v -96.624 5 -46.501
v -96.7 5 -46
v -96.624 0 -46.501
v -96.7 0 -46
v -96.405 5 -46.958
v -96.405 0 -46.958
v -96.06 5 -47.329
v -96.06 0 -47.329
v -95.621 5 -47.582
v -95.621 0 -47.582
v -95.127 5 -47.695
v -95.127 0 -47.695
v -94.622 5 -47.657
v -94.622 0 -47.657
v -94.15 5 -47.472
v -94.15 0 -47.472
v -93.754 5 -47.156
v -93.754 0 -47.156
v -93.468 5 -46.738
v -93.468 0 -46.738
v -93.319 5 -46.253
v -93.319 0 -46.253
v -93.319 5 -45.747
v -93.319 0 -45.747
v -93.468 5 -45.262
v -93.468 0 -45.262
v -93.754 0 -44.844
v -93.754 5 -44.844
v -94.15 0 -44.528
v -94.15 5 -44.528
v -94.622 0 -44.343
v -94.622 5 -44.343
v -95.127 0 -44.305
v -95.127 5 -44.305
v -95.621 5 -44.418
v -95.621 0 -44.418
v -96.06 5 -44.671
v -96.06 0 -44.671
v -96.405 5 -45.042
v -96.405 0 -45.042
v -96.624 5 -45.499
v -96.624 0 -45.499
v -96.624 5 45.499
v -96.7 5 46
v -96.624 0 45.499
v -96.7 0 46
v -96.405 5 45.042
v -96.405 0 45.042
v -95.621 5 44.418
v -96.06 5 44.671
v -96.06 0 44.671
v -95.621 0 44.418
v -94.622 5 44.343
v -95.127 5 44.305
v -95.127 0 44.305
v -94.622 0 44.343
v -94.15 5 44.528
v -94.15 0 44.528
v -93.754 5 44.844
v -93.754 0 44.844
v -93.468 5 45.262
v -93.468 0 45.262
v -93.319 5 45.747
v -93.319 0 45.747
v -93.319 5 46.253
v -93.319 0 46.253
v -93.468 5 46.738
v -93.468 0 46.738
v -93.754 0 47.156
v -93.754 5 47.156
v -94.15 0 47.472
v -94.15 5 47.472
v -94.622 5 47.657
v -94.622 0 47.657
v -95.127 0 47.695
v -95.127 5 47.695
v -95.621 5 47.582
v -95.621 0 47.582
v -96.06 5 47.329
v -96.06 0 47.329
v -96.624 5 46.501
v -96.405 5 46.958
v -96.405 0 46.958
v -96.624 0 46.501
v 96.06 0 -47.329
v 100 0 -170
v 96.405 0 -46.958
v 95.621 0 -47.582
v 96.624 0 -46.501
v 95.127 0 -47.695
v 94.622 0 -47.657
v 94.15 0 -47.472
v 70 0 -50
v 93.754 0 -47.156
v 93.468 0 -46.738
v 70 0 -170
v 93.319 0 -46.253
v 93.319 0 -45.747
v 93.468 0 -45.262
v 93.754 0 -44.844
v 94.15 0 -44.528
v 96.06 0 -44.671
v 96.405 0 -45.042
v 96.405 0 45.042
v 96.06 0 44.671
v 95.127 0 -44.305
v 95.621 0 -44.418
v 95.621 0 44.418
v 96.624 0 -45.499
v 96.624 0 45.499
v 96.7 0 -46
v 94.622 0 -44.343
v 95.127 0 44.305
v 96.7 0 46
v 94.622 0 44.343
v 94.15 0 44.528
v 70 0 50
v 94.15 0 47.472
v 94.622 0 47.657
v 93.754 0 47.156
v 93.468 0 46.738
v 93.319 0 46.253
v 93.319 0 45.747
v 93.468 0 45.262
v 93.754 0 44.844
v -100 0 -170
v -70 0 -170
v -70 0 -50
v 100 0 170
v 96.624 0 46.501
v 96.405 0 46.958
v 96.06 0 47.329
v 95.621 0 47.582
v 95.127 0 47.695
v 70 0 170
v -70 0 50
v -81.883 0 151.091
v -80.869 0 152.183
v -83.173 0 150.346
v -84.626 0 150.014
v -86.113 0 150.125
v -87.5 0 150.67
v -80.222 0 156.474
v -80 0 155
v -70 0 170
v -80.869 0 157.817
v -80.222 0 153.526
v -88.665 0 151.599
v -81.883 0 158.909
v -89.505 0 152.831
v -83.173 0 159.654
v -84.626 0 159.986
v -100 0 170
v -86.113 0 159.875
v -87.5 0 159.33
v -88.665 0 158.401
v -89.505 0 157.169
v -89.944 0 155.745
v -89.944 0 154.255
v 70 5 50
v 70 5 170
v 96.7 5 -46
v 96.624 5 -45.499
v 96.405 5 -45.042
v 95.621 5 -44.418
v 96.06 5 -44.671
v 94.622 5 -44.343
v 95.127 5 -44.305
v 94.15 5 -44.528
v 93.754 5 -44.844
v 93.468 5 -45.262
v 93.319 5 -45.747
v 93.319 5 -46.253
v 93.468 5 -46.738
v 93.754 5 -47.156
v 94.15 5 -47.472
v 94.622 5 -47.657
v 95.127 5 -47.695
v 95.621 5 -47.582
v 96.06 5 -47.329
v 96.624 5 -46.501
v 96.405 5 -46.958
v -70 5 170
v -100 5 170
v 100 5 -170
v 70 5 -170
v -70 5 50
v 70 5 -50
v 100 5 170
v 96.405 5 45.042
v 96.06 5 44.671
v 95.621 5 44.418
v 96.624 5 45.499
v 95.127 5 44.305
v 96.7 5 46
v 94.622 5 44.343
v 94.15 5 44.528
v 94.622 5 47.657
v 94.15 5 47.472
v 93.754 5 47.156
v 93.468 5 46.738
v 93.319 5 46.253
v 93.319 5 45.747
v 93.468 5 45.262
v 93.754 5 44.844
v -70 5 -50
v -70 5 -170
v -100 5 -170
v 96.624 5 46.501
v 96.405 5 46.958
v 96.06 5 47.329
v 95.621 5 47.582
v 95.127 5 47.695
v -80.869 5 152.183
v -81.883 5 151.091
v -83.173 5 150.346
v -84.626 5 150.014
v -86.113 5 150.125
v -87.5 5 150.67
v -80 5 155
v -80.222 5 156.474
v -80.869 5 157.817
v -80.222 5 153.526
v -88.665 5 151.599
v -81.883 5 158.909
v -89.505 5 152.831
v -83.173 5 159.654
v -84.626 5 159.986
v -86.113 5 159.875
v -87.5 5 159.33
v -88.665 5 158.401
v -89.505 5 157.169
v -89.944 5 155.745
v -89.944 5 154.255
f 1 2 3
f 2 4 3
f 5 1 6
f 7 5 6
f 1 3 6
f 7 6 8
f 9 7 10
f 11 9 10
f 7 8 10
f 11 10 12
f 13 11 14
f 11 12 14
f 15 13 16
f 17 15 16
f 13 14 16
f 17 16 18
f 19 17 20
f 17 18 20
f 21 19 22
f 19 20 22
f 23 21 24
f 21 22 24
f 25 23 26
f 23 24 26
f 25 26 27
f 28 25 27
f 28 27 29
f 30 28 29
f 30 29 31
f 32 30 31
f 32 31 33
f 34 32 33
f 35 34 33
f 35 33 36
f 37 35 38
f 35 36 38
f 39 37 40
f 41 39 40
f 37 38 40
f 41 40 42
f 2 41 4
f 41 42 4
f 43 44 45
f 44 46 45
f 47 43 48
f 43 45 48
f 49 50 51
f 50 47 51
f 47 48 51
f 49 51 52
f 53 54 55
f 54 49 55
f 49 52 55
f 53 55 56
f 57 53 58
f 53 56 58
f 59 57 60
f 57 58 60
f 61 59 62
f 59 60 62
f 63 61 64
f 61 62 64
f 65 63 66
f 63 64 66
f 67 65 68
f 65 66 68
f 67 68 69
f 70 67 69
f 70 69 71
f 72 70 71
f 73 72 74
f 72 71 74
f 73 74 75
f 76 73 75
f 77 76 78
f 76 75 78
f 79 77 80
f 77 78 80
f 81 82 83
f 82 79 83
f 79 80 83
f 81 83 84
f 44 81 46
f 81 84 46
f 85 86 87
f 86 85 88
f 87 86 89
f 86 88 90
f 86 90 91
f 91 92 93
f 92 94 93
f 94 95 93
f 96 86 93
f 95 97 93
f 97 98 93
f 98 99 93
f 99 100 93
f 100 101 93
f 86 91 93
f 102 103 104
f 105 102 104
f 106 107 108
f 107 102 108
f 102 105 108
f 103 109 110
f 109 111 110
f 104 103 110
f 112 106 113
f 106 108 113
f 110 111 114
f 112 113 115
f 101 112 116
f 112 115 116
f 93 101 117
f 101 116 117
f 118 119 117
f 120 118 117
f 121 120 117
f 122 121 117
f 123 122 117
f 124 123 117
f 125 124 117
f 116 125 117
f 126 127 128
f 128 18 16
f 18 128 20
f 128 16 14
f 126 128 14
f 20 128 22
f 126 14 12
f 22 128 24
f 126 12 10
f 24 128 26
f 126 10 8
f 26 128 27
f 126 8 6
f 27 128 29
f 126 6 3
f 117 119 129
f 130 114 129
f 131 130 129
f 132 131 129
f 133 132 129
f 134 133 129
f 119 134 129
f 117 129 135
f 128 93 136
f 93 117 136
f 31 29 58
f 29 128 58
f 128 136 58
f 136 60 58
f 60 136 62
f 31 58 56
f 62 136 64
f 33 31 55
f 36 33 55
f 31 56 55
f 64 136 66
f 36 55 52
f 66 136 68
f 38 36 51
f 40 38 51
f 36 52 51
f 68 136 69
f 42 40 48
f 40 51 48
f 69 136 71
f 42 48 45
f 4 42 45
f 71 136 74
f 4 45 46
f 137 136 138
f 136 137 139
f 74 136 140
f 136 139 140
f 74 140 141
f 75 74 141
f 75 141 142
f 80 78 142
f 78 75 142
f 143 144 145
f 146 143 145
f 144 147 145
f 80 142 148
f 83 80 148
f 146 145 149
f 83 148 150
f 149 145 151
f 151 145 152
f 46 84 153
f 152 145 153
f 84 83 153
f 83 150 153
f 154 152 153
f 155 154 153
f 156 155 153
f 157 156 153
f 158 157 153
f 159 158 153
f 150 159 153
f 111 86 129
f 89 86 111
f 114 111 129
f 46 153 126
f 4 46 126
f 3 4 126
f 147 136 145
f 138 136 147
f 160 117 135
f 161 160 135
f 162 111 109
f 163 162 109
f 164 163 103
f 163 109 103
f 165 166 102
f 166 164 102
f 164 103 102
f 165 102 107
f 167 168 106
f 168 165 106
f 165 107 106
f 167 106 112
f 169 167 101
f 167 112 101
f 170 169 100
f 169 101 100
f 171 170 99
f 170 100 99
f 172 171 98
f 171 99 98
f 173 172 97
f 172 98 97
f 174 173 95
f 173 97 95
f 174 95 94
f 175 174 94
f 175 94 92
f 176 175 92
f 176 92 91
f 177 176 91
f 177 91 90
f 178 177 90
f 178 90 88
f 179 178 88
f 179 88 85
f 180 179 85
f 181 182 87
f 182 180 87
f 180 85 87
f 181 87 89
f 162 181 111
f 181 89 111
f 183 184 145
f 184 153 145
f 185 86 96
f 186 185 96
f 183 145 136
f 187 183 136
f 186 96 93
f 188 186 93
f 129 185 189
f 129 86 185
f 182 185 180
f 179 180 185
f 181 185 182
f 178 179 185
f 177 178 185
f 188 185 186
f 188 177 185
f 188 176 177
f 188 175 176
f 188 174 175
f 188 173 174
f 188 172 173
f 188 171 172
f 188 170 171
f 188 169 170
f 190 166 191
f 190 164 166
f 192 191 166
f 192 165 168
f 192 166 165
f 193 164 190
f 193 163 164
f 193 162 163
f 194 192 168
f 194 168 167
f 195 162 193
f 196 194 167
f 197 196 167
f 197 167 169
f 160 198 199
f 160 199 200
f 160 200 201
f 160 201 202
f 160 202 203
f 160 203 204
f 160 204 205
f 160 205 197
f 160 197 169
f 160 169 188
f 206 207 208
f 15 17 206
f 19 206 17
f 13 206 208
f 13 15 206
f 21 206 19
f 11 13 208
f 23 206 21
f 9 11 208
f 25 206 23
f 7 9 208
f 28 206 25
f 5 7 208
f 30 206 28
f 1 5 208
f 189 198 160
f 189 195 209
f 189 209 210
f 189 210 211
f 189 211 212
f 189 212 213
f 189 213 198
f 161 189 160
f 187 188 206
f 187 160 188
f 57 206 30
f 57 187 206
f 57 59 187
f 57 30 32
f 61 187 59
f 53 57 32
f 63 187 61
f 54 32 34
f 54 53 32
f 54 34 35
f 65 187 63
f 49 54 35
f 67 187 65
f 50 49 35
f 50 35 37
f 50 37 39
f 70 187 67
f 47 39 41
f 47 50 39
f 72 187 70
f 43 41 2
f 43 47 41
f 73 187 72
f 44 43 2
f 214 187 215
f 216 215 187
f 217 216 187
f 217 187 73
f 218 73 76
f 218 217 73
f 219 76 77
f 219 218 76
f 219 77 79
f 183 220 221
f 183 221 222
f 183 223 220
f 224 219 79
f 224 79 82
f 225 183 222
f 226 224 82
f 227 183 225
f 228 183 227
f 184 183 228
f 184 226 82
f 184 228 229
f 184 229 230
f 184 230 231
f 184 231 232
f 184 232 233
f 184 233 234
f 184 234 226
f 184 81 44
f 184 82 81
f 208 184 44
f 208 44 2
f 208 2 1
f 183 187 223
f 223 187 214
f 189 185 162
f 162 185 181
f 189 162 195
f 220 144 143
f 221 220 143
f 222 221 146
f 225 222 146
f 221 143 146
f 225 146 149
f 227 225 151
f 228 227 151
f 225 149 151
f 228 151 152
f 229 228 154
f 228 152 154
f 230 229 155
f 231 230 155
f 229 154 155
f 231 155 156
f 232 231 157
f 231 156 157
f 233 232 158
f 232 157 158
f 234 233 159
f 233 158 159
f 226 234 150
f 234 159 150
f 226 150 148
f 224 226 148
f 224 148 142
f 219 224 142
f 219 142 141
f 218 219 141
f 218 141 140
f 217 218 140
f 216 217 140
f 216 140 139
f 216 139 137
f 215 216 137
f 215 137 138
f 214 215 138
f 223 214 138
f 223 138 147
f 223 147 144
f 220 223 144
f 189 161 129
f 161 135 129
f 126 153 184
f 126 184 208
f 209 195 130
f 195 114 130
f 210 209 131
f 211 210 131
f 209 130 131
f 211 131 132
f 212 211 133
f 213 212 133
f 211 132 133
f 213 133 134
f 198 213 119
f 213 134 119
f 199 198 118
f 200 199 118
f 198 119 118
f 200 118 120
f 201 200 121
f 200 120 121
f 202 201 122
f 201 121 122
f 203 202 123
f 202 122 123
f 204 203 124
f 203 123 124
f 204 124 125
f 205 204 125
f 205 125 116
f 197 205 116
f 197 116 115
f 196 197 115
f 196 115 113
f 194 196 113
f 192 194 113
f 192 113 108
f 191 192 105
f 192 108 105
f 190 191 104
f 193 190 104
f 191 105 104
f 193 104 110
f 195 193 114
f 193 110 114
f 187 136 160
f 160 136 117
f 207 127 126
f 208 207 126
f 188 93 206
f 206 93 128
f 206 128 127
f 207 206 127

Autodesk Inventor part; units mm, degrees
ref_plane "YZ Plane" through (0, 0, 0) normal (1, 0, 0) x (0, 1, 0)
ref_plane "XZ Plane" through (0, 0, 0) normal (0, 1, 0) x (-1, 0, 0)
ref_plane "XY Plane" through (0, 0, 0) normal (0, 0, 1) x (1, 0, 0)
sketch "Skizze1" plane through (0, 0, 0) normal (0, 1, 0) x (-1, 0, 0)
  line L0 (127.3199, 0) -> (-102.7808, 0) construction
  line L1 (0, 142.2638) -> (0, -235.5235) construction
  line L2 (100, 50) -> (100, 0)
  line L3 (70, 50) -> (0, 50)
  line L4 (0, 0) -> (100, 0)
  line L5 (0, 50) -> (0, 0)
  line L6 (100, 50) -> (100, 170)
  line L7 (100, 170) -> (70, 170)
  line L8 (70, 170) -> (70, 50)
  circle A0 centre (95, 46) radius 1.7
  dimension "d10" = 100
  dimension "d12" = 30
  dimension "d13" = 170
  dimension "d14" = 50
  dimension "d22" = 5
  dimension "d23" = 4
  dimension "d26" = 3.4
extrude "Extrusion1" add sketch "Skizze1" along normal blind 5
ref_plane "Arbeitsebene1" through (0, 0, 50) normal (1, 0, 0) x (0, 1, 0)
ref_plane "Arbeitsebene2" through (0, 5, 0) normal (0, 0, -1) x (-1, 0, 0)
mirror "Spiegeln1" about plane through (0, 5, 0) normal (0, 0, -1) of "Extrusion1"
pattern_circular "Runde Anordnung1" count 2 over 360 about axis through (0, 5, 0) along (0, -1, 0) of "Extrusion1"
mirror "Spiegeln2" about plane through (0, 0, 50) normal (1, 0, 0) of "Extrusion1"
mirror "Spiegeln3" about plane through (0, 5, 0) normal (0, 0, -1) of "Extrusion1"
sketch "Skizze2" plane through (0, 0, 0) normal (0, -1, 0) x (1, 0, 0)
  line L0 (-100, 170) -> (-100, -170) construction
  line L1 (-100, 170) -> (-70, 170) construction
  line L2 (-100, 140) -> (-70, 140)
  line L3 (-70, 170) -> (-70, 50) projected
  circle A0 centre (-85, 155) radius 5
  point P0 (0, 0)
  dimension "d28" = 30
  dimension "d29" = 15
  dimension "d31" = 10
extrude "Extrusion3" cut sketch "Skizze2" against normal blind 10
properties part number "Chassis-1"
